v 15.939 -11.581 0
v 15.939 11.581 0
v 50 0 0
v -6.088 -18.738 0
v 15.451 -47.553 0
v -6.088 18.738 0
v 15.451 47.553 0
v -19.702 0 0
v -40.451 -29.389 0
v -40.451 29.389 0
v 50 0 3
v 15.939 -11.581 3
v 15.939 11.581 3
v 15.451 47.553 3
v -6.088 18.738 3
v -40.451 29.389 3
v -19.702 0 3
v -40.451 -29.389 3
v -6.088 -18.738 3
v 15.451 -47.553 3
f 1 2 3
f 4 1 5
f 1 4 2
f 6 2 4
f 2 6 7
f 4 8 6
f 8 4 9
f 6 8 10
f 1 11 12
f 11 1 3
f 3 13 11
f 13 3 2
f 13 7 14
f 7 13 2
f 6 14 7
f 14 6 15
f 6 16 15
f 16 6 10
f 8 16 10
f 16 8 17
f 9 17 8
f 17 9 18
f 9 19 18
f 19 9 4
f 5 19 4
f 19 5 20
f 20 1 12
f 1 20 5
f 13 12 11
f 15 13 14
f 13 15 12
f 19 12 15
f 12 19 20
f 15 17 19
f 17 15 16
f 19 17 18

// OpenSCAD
// POINTY STAR
// fully parameterized pointy star
//
// created by Moritz Walter 2014
// iamnotachoice.com
// released under GPLv3 http://www.gnu.org/licenses/gpl.html

cornerCount = 5;
starRadius = 50;
cornerWidth = 17;
cornerHeight = 15;
cornerFN = 4;
maniFix=0.01;
halve=true;

// experimental
useExperimentalTruncation=false;

boks(cornerCount, starRadius, cornerWidth, cornerHeight, cornerFN, maniFix, useExperimentalTruncation, 40, 3, 2);

module boks(cornerCount, starRadius, cornerWidth, cornerHeight, cornerFN, maniFix, useExperimentalTruncation, boxheight, floors, walls) {
    difference() {
        linear_extrude(boxheight) {
            projection() {
                echo("halveStar(", cornerCount, ", ", starRadius, ", ", cornerWidth, ", ", cornerHeight, ", ", cornerFN, ", ", maniFix, ", ", useExperimentalTruncation, ");");
                halveStar(cornerCount, starRadius, cornerWidth, cornerHeight, cornerFN, maniFix, useExperimentalTruncation);
            }
        }
        translate([0,0,floors]) {
            linear_extrude(boxheight-floors) {
                projection() {
                echo("halveStar(", cornerCount, ", ", starRadius-walls, ", ", cornerWidth-walls, ", ", cornerHeight, ", ", cornerFN, ", ", maniFix, ", ", useExperimentalTruncation, ");");
                    halveStar(cornerCount, 10, cornerWidth-walls, cornerHeight, cornerFN, maniFix, useExperimentalTruncation);
                }
            }
        }
    }
}

module lokk(cornerCount, starRadius, cornerWidth, cornerHeight, cornerFN, maniFix, useExperimentalTruncation) {
    translate([0,0,boxheight]) {
        halveStar();
    }
}


/*
if (halve){
	halveStar(cornerCount,starRadius,cornerWidth,cornerHeight,cornerFN,maniFix,useExperimentalTruncation);
} else{
	star(cornerCount,starRadius,cornerWidth,cornerHeight,cornerFN,maniFix,useExperimentalTruncation);
}
*/

module halveStar(cornerCount,starRadius,cornerWidth,cornerHeight,cornerFN,maniFix,useExperimentalTruncation) {
	difference() {
		star(cornerCount,starRadius,cornerWidth,cornerHeight,cornerFN,maniFix,useExperimentalTruncation);
		translate([0,0,-cornerHeight])
			cylinder(r=1.3*starRadius,h=2*cornerHeight,center=true,$fn=cornerCount);
	}
}

module star(cornerCount,starRadius,cornerWidth,cornerHeight,cornerFN,maniFix,useExperimentalTruncation) {
	union(){
		for( i=[1:1:cornerCount] ) {
			rotate( [0,0,360/cornerCount * i] )
				truncatedCorner(starRadius, useExperimentalTruncation);
		}
		manifoldFix(cornerHeight, cornerWidth, cornerHeight, maniFix);
		scale([1,1,-1])
			manifoldFix(cornerHeight, cornerWidth, cornerHeight, maniFix);
	}
}

module manifoldFix(cornerHeight, cornerWidth, cornerHeight, maniFix) {
	translate([0,0,cornerHeight/2])
		cylinder(r1=cornerHeight, r2=0,h=cornerHeight+maniFix,center=true);
}

module truncatedCorner(starRadius, useExperimentalTruncation){
	difference(){
		corner();
		translate([-starRadius/2,0,0] )
			cube([starRadius,starRadius,starRadius],center=true);
		if(useExperimentalTruncation){
			rotate([0,0,180/cornerCount])
				translate( [starRadius/2,cornerWidth,0] )
					cube([starRadius,2*cornerWidth,2*cornerHeight],center=true);
			rotate([0,0,-180/cornerCount])
				translate( [starRadius/2,-cornerWidth,0] )
					cube([starRadius,2*cornerWidth,2*cornerHeight],center=true);
		}

	}
}

module corner(){
	scale( [starRadius,cornerWidth,cornerHeight] )
		rotate([0,90,0])
			translate([0,0,0.5])
				cylinder( r1=1, r2=0, h=1, $fn = cornerFN, center=true );

}

module experimentalCorner(){
	for(i=[1:1:cornerSegmentCount]){
		// angle=90-i*90/cornerSegmentCount
		// lastAngle=90-(i-1)*90/cornerSegmentCount
		// x=cos(lastAngle)*starRadius
		// h=(cos(angle)-cos(lastAngle))*starRadius
		// r1=sin(lastAngle);
		// r2=sin(angle)

		// x=cos(90-(i-1)*90/cornerSegmentCount)*starRadius
		// h=(cos(90-i*90/cornerSegmentCount)-cos(90-(i-1)*90/cornerSegmentCount))*starRadius
		// r1=sin(90-(i-1)*90/cornerSegmentCount);
		// r2=sin(90-i*90/cornerSegmentCount)
		scale([1,cornerWidth,cornerHeight])
			translate([(cos(90-i*90/cornerSegmentCount)-cos(90-(i-1)*90/cornerSegmentCount))*starRadius/2+cos(90-(i-1)*90/cornerSegmentCount)*starRadius,0,0] )
				rotate( [0,90,0] )
					cylinder( h=(cos(90-i*90/cornerSegmentCount)-cos(90-(i-1)*90/cornerSegmentCount))*starRadius, r1=sin(90-(i-1)*90/cornerSegmentCount), r2=sin(90-i*90/cornerSegmentCount), $fn = cornerFN, center=true );
	}
}
